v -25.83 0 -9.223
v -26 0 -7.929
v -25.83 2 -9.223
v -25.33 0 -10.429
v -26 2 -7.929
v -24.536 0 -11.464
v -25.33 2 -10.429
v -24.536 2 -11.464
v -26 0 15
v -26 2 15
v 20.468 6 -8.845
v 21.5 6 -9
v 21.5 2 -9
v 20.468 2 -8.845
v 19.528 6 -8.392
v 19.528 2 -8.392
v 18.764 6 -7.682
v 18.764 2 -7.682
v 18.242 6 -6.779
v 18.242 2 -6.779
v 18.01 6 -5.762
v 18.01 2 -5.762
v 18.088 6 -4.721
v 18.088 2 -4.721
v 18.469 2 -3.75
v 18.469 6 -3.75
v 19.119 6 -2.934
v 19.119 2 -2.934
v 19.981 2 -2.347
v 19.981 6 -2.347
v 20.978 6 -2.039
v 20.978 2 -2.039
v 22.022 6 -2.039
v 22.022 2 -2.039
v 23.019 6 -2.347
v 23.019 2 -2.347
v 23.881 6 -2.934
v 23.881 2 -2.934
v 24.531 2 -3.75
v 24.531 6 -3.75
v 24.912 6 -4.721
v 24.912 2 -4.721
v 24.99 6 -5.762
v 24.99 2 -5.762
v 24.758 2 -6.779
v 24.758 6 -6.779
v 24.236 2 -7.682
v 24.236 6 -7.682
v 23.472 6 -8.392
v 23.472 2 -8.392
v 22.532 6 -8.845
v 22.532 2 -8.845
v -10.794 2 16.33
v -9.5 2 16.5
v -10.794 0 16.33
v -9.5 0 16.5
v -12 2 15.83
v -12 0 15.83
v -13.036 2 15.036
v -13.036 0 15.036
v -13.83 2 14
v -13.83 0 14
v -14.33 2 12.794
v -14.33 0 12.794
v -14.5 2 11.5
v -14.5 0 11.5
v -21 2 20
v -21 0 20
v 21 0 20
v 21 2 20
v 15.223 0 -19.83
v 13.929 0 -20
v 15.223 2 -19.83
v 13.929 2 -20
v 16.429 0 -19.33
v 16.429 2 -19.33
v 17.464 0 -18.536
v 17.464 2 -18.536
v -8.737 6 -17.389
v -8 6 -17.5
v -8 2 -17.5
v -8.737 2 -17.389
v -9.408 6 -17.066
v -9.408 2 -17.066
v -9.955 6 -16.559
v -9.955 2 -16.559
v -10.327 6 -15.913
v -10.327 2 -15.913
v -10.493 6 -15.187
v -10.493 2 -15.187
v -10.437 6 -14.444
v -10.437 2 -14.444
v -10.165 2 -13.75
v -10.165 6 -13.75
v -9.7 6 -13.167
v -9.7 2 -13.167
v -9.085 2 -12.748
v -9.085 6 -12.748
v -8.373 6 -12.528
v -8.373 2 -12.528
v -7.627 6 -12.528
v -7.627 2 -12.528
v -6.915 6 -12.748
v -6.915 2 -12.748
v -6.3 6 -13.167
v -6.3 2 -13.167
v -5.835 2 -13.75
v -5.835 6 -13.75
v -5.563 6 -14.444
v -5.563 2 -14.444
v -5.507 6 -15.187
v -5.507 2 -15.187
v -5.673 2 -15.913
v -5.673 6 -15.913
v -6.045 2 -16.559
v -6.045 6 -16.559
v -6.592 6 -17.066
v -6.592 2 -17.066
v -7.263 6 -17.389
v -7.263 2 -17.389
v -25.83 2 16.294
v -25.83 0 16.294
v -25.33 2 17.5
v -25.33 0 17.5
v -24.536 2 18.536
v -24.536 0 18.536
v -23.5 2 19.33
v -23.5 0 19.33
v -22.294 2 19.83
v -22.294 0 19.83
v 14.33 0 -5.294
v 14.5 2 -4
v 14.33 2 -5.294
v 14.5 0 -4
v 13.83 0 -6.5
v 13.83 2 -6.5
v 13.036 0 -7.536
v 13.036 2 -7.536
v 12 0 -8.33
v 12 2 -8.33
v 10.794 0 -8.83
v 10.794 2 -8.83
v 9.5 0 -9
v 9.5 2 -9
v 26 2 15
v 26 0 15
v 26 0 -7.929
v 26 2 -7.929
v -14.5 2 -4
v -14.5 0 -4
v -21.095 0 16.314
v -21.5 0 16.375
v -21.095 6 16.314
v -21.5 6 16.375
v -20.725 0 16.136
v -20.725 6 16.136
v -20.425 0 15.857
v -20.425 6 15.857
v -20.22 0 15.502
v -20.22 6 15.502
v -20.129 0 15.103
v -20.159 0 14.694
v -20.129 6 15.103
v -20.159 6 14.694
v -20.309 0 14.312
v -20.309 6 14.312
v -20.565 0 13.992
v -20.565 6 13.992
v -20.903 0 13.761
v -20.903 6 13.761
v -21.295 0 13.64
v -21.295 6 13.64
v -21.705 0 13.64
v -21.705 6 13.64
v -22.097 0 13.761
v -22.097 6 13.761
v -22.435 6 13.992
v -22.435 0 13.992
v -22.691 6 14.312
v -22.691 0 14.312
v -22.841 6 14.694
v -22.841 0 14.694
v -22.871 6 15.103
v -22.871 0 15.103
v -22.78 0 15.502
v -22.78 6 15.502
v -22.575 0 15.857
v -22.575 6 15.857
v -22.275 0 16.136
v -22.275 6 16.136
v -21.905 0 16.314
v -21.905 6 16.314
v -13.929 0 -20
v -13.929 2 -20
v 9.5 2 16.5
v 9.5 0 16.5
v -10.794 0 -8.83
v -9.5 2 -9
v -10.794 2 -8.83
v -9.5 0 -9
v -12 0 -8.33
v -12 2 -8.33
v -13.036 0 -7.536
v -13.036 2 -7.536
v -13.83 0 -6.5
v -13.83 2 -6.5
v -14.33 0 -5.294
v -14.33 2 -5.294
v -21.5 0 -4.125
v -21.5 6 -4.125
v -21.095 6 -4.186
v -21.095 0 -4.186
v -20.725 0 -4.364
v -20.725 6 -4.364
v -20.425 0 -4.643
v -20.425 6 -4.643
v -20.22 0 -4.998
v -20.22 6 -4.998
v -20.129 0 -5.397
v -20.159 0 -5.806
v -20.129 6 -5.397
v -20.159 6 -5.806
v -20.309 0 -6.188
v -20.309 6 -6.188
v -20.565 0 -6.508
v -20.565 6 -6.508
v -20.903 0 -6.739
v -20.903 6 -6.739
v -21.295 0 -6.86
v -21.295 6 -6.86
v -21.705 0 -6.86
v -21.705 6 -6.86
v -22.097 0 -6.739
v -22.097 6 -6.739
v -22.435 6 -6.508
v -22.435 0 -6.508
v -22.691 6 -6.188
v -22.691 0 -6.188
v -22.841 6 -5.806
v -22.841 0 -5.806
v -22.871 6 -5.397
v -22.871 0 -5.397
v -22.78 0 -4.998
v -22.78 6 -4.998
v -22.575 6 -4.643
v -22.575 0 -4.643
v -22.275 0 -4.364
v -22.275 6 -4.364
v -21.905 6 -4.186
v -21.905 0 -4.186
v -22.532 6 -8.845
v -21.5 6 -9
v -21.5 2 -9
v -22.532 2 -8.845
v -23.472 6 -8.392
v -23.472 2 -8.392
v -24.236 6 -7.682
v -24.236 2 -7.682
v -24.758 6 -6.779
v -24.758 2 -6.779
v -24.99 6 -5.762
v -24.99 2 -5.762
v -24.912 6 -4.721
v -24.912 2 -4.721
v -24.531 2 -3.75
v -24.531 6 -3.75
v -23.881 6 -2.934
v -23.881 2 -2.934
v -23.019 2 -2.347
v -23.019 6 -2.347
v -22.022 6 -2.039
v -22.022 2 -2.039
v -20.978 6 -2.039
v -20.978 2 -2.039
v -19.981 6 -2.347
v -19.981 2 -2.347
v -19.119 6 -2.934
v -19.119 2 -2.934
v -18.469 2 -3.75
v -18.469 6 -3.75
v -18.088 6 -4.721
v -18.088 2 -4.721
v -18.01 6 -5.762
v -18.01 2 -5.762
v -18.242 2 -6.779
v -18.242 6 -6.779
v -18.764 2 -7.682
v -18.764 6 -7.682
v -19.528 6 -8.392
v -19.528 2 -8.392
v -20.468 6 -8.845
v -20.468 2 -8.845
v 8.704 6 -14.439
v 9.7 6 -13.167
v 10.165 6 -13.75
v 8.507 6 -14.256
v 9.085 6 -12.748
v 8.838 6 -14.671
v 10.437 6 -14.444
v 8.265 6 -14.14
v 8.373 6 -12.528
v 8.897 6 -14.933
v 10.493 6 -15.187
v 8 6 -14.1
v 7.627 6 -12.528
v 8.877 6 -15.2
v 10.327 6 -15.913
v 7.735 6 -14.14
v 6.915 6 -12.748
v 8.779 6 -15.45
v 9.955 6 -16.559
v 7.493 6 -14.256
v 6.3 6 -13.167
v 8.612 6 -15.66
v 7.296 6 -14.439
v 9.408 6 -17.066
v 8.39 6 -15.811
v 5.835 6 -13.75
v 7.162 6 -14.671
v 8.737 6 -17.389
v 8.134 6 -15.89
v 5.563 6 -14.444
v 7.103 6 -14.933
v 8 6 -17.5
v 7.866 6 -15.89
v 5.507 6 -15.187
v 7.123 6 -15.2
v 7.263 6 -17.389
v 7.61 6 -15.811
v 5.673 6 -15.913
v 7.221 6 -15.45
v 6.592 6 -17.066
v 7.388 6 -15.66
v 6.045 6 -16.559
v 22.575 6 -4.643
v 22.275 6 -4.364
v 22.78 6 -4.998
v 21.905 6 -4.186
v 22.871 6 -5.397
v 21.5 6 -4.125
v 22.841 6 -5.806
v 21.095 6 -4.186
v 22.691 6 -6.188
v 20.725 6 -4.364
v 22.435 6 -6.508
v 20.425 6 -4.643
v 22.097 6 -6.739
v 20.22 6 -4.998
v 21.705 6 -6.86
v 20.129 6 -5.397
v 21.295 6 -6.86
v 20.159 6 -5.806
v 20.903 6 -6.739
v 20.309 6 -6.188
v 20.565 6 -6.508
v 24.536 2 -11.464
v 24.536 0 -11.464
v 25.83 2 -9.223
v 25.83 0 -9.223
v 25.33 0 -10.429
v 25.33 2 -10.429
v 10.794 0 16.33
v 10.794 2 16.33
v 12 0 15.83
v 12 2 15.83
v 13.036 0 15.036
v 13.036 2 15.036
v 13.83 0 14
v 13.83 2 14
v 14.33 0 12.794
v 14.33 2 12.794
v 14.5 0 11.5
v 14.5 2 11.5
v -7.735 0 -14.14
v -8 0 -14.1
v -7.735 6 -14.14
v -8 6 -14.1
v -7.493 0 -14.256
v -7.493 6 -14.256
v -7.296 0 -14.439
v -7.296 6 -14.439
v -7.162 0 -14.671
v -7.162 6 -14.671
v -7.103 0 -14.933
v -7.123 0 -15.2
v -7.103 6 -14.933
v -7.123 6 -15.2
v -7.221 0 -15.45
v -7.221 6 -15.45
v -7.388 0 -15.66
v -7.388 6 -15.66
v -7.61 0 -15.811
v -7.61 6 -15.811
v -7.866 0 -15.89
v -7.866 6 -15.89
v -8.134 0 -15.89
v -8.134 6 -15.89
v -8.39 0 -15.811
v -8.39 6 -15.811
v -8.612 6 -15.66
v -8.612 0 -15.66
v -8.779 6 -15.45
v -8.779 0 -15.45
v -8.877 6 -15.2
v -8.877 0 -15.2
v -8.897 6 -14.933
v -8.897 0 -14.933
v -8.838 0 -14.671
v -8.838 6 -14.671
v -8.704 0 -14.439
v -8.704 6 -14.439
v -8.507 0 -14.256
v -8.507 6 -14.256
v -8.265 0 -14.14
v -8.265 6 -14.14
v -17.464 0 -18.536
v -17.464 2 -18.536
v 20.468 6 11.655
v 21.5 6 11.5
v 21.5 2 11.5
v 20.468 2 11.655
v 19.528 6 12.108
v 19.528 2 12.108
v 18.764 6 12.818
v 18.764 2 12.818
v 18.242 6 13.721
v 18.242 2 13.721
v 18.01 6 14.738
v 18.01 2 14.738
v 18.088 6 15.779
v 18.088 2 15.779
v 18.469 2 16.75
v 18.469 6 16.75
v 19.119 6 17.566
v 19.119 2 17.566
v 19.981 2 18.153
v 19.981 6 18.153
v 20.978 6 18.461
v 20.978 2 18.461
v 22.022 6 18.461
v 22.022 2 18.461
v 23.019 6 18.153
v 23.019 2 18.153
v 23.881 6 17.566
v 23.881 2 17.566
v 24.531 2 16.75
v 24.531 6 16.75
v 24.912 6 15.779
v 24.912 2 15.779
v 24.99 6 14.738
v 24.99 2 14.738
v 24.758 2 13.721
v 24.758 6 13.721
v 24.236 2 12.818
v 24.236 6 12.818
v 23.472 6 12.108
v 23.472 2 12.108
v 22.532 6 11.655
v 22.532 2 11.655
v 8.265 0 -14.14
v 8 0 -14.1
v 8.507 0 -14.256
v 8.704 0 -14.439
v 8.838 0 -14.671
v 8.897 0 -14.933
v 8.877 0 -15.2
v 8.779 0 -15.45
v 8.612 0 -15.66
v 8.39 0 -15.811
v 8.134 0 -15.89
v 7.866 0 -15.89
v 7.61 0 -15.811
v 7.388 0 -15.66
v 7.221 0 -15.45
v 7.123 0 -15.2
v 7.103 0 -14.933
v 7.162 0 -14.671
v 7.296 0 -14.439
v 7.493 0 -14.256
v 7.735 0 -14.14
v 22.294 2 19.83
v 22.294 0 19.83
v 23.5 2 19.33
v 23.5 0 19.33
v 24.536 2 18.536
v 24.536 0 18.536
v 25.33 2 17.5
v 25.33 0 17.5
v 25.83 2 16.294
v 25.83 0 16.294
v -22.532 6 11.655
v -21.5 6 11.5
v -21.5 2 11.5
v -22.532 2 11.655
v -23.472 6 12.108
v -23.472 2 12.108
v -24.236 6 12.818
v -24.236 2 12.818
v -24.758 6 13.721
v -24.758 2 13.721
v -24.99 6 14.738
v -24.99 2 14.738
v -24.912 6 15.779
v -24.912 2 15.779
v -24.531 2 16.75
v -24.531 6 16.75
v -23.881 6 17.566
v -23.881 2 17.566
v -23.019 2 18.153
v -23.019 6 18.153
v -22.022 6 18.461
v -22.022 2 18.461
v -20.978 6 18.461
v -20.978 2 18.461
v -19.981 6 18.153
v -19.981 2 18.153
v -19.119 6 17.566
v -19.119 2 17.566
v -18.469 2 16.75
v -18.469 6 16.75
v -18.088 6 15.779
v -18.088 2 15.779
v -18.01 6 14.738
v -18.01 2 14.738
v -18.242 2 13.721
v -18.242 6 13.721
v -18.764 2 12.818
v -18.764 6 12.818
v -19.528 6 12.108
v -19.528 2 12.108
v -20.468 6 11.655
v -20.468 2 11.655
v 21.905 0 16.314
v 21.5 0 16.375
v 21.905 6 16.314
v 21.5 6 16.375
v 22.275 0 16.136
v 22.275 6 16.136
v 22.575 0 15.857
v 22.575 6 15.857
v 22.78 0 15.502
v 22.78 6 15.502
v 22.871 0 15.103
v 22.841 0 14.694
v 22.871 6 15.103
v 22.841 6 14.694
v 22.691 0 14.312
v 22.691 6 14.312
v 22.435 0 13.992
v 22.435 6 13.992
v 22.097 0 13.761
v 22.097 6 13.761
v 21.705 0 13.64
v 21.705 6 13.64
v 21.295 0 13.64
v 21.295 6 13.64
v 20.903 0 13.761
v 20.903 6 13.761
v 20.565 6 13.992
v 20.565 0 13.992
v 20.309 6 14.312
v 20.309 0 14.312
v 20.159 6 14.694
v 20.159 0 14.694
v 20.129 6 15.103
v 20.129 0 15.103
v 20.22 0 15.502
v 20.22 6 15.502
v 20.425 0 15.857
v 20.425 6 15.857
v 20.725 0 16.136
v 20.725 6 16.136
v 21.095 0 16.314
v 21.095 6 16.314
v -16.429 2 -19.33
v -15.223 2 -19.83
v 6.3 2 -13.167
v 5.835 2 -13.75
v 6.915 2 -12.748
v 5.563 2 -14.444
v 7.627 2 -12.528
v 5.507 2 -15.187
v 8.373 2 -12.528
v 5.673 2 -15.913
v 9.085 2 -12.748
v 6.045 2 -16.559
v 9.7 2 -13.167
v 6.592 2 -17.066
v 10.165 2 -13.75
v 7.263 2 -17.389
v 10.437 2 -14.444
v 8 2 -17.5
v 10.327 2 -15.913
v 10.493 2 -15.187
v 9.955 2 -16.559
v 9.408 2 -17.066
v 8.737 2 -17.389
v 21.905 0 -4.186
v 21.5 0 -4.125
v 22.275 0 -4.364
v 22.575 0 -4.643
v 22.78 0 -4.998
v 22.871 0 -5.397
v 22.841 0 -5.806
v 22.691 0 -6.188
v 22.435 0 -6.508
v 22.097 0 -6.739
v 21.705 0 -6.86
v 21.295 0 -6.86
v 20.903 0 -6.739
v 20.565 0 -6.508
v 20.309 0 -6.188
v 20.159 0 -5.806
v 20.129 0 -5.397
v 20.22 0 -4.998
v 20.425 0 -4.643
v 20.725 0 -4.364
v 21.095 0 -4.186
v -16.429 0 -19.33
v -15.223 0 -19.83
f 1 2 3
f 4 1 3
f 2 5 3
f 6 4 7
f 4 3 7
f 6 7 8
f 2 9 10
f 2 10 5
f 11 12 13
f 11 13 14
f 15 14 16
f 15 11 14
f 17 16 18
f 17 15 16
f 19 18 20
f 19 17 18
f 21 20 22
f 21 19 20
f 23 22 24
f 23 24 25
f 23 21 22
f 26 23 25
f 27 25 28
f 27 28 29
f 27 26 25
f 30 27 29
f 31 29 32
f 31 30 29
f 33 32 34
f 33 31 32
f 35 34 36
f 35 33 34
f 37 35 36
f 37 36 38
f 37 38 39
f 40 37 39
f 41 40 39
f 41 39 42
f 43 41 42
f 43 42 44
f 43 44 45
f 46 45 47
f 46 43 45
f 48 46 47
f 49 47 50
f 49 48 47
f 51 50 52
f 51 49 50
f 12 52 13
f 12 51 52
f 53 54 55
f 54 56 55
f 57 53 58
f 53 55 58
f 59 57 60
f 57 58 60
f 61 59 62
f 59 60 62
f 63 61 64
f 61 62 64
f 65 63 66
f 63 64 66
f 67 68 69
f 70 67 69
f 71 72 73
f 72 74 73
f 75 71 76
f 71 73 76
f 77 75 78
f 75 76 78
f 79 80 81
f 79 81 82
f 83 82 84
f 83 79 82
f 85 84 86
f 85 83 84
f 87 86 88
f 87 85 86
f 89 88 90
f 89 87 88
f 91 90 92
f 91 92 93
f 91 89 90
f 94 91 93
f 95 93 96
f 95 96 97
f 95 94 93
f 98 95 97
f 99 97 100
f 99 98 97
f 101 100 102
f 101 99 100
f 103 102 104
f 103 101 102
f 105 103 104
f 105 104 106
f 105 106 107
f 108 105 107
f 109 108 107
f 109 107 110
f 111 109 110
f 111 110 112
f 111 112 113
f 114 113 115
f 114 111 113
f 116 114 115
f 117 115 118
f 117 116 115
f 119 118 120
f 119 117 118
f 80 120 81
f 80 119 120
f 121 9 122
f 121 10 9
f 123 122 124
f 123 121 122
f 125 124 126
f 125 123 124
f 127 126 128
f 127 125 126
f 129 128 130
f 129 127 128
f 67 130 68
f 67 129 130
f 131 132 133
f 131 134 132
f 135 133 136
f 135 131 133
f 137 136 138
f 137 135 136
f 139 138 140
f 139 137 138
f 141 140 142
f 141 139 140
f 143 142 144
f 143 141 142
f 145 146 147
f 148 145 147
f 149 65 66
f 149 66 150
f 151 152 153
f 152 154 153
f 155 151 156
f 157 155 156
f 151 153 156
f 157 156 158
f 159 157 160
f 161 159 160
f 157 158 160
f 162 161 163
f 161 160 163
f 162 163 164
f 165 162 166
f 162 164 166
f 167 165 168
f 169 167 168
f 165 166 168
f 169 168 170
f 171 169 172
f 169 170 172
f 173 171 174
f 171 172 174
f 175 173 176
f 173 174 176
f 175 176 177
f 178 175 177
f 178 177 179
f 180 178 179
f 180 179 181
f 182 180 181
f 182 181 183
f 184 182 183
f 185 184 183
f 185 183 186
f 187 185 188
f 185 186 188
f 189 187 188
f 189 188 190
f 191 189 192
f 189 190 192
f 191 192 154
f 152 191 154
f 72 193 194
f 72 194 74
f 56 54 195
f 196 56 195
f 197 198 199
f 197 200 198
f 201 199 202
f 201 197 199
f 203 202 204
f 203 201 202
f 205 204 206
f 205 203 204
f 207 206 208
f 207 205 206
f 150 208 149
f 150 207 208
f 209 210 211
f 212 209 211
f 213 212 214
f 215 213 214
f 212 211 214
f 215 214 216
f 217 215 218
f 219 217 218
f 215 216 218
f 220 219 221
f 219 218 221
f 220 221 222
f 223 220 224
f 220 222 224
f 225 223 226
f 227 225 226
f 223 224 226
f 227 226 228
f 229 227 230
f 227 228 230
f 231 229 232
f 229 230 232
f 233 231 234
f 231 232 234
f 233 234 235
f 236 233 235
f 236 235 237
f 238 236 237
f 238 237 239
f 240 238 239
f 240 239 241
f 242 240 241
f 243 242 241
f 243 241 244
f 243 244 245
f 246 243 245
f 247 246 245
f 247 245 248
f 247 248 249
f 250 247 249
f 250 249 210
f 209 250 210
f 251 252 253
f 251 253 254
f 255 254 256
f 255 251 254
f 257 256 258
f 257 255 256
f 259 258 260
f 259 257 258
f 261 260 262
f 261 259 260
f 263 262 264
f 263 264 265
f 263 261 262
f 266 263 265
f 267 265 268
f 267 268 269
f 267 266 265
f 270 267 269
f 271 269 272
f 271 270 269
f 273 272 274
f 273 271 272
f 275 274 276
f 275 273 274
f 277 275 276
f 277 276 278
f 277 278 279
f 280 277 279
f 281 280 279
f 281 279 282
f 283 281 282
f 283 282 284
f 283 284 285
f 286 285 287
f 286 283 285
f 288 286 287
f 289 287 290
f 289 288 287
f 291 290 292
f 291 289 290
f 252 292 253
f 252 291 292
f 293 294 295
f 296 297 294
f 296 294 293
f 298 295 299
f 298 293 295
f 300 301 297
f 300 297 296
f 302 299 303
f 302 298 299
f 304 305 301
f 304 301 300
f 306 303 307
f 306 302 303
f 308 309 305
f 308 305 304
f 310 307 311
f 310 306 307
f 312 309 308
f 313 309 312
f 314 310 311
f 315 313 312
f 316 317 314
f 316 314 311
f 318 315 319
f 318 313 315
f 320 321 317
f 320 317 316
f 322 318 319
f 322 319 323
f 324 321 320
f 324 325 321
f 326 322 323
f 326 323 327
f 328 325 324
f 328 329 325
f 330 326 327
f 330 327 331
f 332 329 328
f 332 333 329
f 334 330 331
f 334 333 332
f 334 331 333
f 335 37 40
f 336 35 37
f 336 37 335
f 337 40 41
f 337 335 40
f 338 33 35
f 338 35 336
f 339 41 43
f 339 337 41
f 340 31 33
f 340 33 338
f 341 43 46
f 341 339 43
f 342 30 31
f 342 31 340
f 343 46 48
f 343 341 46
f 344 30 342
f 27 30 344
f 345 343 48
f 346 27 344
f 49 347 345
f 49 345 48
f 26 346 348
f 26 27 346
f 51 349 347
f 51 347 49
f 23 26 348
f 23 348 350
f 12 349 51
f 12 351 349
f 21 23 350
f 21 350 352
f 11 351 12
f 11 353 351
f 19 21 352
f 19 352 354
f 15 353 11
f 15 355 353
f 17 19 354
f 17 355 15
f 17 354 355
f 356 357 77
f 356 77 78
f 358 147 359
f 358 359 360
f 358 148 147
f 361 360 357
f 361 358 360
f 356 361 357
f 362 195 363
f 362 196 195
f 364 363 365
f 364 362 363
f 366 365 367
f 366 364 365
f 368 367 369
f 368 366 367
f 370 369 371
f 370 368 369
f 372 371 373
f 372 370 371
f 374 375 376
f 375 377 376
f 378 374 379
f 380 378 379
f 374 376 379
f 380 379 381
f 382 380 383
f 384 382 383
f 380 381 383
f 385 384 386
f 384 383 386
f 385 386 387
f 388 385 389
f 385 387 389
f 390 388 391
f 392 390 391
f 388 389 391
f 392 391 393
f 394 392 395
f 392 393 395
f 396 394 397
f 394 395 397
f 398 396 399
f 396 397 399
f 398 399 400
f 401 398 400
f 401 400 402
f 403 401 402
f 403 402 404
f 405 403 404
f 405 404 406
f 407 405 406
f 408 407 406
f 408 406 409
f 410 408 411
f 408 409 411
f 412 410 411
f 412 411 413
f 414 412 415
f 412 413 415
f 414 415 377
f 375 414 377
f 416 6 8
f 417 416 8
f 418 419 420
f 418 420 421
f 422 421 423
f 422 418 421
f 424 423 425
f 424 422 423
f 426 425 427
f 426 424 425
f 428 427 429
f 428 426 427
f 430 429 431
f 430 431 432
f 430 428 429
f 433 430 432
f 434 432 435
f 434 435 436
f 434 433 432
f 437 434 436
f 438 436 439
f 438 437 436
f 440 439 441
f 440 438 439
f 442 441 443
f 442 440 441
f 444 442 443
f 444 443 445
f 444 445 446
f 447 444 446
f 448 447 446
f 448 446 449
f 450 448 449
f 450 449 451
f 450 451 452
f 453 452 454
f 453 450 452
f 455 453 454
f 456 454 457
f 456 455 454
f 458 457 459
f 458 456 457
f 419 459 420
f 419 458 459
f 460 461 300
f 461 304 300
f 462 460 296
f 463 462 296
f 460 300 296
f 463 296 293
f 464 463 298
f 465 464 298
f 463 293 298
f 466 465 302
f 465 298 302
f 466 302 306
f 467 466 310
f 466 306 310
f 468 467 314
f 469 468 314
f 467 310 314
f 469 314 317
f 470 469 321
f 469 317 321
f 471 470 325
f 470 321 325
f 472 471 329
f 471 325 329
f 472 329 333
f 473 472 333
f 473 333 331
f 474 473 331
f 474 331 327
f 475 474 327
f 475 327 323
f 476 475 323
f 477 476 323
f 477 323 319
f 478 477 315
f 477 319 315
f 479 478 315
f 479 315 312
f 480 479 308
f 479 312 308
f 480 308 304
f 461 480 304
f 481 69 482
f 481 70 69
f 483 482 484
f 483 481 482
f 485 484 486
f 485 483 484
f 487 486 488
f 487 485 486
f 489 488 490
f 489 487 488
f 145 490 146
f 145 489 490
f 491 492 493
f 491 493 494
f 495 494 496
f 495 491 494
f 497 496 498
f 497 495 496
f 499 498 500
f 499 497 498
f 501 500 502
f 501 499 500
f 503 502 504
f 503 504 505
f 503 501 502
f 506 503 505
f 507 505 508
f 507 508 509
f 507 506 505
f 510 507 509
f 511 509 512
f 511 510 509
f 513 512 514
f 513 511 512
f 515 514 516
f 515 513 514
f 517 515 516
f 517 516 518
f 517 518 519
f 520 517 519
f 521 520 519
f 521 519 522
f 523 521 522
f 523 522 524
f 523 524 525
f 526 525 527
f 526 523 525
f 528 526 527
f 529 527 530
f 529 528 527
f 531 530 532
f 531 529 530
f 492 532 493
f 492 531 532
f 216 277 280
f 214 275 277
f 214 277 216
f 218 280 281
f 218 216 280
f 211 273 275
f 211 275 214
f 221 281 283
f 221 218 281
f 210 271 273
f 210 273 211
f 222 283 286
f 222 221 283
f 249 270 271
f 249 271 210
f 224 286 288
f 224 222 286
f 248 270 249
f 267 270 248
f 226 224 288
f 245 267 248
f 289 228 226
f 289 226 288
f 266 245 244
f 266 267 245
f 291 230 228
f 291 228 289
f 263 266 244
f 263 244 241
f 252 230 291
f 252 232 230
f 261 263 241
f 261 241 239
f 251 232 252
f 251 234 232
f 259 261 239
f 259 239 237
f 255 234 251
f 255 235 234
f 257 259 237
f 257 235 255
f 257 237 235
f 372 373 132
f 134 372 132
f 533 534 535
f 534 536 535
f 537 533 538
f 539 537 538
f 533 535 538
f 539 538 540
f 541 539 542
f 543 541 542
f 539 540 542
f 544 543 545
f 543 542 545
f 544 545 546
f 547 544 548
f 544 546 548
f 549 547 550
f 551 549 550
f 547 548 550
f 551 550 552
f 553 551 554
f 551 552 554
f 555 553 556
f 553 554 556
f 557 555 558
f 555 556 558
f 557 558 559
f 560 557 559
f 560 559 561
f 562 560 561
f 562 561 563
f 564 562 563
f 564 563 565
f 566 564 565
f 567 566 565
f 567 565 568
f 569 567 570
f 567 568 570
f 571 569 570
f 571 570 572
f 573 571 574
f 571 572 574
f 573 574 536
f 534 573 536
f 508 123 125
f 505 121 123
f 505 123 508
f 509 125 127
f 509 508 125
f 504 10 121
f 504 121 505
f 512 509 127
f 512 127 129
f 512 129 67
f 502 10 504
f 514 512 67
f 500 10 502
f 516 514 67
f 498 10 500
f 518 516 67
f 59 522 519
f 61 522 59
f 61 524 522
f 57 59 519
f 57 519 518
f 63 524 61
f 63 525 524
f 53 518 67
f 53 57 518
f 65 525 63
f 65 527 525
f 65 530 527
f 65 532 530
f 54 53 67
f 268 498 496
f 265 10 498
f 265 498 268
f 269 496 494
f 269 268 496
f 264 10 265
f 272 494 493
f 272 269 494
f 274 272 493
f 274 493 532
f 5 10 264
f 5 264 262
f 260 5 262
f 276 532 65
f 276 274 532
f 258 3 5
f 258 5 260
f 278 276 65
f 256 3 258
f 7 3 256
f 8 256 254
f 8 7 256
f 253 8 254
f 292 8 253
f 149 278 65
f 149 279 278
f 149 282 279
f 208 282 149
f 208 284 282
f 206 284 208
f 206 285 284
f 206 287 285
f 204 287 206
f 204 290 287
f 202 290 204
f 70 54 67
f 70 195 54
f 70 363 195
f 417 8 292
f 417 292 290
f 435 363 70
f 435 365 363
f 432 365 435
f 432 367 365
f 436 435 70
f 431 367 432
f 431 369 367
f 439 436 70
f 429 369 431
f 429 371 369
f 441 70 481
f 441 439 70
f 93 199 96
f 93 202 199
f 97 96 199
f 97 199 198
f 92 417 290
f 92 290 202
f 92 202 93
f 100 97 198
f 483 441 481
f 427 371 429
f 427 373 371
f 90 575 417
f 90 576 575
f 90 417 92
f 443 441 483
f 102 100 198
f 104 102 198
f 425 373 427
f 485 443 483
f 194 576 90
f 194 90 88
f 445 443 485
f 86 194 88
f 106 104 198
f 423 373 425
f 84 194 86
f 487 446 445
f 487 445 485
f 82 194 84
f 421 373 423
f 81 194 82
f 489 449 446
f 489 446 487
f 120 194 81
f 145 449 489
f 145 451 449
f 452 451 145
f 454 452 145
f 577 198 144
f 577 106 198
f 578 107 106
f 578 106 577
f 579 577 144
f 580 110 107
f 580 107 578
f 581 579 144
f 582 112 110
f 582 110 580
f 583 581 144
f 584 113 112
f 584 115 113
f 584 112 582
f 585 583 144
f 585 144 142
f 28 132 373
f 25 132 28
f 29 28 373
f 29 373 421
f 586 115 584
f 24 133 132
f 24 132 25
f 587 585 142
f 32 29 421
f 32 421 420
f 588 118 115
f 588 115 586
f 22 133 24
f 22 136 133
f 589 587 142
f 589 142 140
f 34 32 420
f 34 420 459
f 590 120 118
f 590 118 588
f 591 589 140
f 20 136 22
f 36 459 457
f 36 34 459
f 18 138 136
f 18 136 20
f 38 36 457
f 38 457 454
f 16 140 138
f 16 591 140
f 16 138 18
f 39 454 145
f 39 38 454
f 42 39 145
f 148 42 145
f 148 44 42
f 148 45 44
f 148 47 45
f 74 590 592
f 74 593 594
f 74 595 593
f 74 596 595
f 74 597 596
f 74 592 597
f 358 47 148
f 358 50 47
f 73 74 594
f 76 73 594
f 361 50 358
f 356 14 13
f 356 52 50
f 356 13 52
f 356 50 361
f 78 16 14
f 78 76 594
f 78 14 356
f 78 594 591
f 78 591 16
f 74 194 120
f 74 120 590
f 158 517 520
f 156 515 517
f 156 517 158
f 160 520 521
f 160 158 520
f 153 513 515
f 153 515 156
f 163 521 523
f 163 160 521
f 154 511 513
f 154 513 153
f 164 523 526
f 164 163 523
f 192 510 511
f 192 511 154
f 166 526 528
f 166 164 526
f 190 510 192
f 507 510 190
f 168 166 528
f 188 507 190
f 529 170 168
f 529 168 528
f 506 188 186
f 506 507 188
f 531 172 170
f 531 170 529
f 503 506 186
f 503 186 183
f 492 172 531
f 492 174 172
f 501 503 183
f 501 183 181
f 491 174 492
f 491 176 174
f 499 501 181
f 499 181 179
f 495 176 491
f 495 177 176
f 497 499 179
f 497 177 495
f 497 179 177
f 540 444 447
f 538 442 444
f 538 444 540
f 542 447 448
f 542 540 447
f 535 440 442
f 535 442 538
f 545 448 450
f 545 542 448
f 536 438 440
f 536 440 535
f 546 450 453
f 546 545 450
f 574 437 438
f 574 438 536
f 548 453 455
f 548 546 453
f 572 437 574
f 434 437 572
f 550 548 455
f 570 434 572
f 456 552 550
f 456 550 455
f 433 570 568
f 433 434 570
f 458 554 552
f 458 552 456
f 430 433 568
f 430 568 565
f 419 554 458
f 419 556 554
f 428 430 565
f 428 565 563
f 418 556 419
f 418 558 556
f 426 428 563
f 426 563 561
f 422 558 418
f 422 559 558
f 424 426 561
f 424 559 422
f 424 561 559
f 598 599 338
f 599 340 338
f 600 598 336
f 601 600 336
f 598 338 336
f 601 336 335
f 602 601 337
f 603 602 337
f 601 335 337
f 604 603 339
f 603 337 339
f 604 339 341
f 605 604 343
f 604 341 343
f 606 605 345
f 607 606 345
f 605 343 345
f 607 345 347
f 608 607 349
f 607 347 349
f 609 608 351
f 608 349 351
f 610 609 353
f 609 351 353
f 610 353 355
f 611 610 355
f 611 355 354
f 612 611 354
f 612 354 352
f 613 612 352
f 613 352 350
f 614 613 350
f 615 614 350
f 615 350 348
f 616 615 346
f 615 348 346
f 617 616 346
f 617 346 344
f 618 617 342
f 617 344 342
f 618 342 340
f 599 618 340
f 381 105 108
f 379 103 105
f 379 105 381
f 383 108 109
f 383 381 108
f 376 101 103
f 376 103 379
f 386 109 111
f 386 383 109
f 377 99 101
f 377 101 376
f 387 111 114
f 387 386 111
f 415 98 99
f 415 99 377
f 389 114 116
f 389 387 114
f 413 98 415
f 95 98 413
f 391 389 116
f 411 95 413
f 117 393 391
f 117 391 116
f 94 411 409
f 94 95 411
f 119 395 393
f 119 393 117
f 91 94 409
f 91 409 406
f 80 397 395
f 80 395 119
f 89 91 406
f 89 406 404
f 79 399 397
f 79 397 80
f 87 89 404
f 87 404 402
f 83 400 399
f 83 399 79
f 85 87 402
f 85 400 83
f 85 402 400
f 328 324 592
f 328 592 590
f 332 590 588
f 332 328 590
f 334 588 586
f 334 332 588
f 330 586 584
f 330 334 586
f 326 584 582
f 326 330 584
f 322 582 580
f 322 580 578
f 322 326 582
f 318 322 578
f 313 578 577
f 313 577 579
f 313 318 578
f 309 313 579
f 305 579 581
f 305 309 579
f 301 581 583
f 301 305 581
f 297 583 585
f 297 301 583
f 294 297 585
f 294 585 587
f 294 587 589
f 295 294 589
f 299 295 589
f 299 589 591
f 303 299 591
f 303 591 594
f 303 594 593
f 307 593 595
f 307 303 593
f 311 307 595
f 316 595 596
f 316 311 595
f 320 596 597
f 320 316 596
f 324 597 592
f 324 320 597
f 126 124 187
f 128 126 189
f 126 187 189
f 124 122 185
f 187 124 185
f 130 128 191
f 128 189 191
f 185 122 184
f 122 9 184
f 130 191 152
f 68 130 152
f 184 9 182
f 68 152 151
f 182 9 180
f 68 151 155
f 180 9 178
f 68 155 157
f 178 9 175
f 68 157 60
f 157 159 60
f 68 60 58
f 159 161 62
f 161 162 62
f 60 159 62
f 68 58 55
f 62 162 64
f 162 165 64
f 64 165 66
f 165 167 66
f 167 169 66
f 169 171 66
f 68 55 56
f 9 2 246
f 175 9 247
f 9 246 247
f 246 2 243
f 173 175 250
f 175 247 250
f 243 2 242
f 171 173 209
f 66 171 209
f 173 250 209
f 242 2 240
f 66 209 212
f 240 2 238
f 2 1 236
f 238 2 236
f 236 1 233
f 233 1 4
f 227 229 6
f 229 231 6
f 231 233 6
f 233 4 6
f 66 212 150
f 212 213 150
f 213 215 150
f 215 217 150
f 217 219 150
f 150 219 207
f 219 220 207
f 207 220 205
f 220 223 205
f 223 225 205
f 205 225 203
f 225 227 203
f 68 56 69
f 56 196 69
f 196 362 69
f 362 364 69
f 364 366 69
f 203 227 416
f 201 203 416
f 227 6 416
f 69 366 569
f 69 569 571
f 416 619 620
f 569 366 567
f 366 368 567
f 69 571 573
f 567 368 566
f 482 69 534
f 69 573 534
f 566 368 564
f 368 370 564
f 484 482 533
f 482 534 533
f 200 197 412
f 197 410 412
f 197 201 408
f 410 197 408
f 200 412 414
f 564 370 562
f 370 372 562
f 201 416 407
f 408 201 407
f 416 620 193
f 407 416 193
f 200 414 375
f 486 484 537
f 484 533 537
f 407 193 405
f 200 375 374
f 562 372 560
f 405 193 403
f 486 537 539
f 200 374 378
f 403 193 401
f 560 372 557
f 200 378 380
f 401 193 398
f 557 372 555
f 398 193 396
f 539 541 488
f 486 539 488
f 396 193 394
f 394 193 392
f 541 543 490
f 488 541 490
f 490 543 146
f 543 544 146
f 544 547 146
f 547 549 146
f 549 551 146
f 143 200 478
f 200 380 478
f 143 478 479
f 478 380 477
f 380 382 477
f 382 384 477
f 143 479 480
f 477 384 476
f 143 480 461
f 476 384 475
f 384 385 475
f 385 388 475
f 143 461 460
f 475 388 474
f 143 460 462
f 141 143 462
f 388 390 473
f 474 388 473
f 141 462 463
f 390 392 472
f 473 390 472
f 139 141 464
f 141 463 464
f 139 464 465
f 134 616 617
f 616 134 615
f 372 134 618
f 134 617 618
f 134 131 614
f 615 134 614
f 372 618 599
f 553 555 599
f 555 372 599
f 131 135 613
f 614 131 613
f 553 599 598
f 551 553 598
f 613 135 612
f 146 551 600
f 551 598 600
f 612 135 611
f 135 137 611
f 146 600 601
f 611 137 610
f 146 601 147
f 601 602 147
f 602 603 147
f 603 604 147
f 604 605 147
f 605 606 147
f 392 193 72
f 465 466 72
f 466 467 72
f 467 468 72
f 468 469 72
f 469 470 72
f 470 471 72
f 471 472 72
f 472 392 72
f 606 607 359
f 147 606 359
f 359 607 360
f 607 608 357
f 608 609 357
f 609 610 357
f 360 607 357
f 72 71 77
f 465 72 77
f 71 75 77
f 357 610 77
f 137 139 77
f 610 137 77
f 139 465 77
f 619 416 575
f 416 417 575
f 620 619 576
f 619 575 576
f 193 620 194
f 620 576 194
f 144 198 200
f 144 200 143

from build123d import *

# Parameters (mm, degrees)
SKETCH1_W           = 52
SKETCH1_H           = 40
BOSS_EXTRUDE1_DEPTH = 2
SKETCH2_R           = 0.9
SKETCH2_R_2         = 1.375
CUT_EXTRUDE1_DEPTH  = 33.86335345
BOSS_EXTRUDE2_START = 4
SKETCH3_R           = 3.5
SKETCH3_R_2         = 1.375
SKETCH3_R_3         = 2.5
SKETCH3_R_4         = 0.9
BOSS_EXTRUDE2_DEPTH = 4
SKETCH4_W           = 29
SKETCH4_H           = 25.5
CUT_EXTRUDE2_DEPTH  = 34.045423284
CHAMFER1_SIZE       = 10
FILLET1_R           = 5


with BuildPart() as part:
    # Sketch1 → Boss-Extrude1 (new body)
    with BuildSketch(Plane(origin=(0, 0, 0), x_dir=(1, 0, 0), z_dir=(0, 1, 0))):
        Rectangle(SKETCH1_W, SKETCH1_H)
    extrude(amount=BOSS_EXTRUDE1_DEPTH)

    # Sketch2 → Cut-Extrude1 (cut, through all)
    with BuildSketch(Plane(origin=(0, 2, 0), x_dir=(1, 0, 0), z_dir=(0, 1, 0))):
        with Locations(Location((8, 15, 0), (0, 0, 270))):
            Circle(SKETCH2_R)
        with Locations(Location((-8, 15, 0), (0, 0, 270))):
            Circle(SKETCH2_R)
        with Locations(Location((-21.5, 5.5, 0), (0, 0, 270))):
            Circle(SKETCH2_R_2)
        with Locations(Location((-21.5, -15, 0), (0, 0, 270))):
            Circle(SKETCH2_R_2)
        with Locations(Location((21.5, -15, 0), (0, 0, 270))):
            Circle(SKETCH2_R_2)
        with Locations(Location((21.5, 5.5, 0), (0, 0, 270))):
            Circle(SKETCH2_R_2)
    extrude(amount=-CUT_EXTRUDE1_DEPTH, mode=Mode.SUBTRACT)

    # Sketch3 → Boss-Extrude2 (add)
    # profile 1 of 6: a face of its own
    with BuildSketch(Plane(origin=(0, 2, 0), x_dir=(1, 0, 0), z_dir=(0, 1, 0)).offset(BOSS_EXTRUDE2_START)):
        with Locations(Location((-21.5, 5.5, 0), (0, 0, 90))):
            Circle(SKETCH3_R)
        with Locations(Location((-21.5, 5.5, 0), (0, 0, 270))):
            Circle(SKETCH3_R_2, mode=Mode.SUBTRACT)
    # profile 2 of 6: a face of its own
    with BuildSketch(Plane(origin=(0, 2, 0), x_dir=(1, 0, 0), z_dir=(0, 1, 0)).offset(BOSS_EXTRUDE2_START)):
        with Locations(Location((-21.5, -15, 0), (0, 0, 90))):
            Circle(SKETCH3_R)
        with Locations(Location((-21.5, -15, 0), (0, 0, 270))):
            Circle(SKETCH3_R_2, mode=Mode.SUBTRACT)
    # profile 3 of 6: a face of its own
    with BuildSketch(Plane(origin=(0, 2, 0), x_dir=(1, 0, 0), z_dir=(0, 1, 0)).offset(BOSS_EXTRUDE2_START)):
        with Locations(Location((21.5, -15, 0), (0, 0, 90))):
            Circle(SKETCH3_R)
        with Locations(Location((21.5, -15, 0), (0, 0, 270))):
            Circle(SKETCH3_R_2, mode=Mode.SUBTRACT)
    # profile 4 of 6: a face of its own
    with BuildSketch(Plane(origin=(0, 2, 0), x_dir=(1, 0, 0), z_dir=(0, 1, 0)).offset(BOSS_EXTRUDE2_START)):
        with Locations(Location((21.5, 5.5, 0), (0, 0, 90))):
            Circle(SKETCH3_R)
        with Locations(Location((21.5, 5.5, 0), (0, 0, 270))):
            Circle(SKETCH3_R_2, mode=Mode.SUBTRACT)
    # profile 5 of 6: a face of its own
    with BuildSketch(Plane(origin=(0, 2, 0), x_dir=(1, 0, 0), z_dir=(0, 1, 0)).offset(BOSS_EXTRUDE2_START)):
        with Locations(Location((8, 15, 0), (0, 0, 90))):
            Circle(SKETCH3_R_3)
        with Locations(Location((8, 15, 0), (0, 0, 270))):
            Circle(SKETCH3_R_4, mode=Mode.SUBTRACT)
    # profile 6 of 6: a face of its own
    with BuildSketch(Plane(origin=(0, 2, 0), x_dir=(1, 0, 0), z_dir=(0, 1, 0)).offset(BOSS_EXTRUDE2_START)):
        with Locations(Location((-8, 15, 0), (0, 0, 90))):
            Circle(SKETCH3_R_3)
        with Locations(Location((-8, 15, 0), (0, 0, 270))):
            Circle(SKETCH3_R_4, mode=Mode.SUBTRACT)
    extrude(amount=-BOSS_EXTRUDE2_DEPTH)

    # Sketch4 → Cut-Extrude2 (cut, through all)
    with BuildSketch(Plane(origin=(0, 2, 0), x_dir=(1, 0, 0), z_dir=(0, 1, 0))):
        with Locations((0, -3.75)):
            Rectangle(SKETCH4_W, SKETCH4_H)
    extrude(amount=-CUT_EXTRUDE2_DEPTH, mode=Mode.SUBTRACT)

    # Chamfer1
    chamfer1_edges = [part.edges().sort_by_distance(p)[0] for p in [
        (-26, 1, -20),
        (26, 1, -20),
    ]]
    chamfer(chamfer1_edges, length=CHAMFER1_SIZE)

    # Fillet1
    fillet1_edges = [part.edges().sort_by_distance(p)[0] for p in [
        (26, 1, 20),
        (-26, 1, 20),
        (14.5, 1, -9),
        (14.5, 1, 16.5),
        (-14.5, 1, 16.5),
        (-14.5, 1, -9),
        (-16, 1, -20),
        (16, 1, -20),
        (26, 1, -10),
        (-26, 1, -10),
    ]]
    fillet(fillet1_edges, radius=FILLET1_R)


solid = part.part
